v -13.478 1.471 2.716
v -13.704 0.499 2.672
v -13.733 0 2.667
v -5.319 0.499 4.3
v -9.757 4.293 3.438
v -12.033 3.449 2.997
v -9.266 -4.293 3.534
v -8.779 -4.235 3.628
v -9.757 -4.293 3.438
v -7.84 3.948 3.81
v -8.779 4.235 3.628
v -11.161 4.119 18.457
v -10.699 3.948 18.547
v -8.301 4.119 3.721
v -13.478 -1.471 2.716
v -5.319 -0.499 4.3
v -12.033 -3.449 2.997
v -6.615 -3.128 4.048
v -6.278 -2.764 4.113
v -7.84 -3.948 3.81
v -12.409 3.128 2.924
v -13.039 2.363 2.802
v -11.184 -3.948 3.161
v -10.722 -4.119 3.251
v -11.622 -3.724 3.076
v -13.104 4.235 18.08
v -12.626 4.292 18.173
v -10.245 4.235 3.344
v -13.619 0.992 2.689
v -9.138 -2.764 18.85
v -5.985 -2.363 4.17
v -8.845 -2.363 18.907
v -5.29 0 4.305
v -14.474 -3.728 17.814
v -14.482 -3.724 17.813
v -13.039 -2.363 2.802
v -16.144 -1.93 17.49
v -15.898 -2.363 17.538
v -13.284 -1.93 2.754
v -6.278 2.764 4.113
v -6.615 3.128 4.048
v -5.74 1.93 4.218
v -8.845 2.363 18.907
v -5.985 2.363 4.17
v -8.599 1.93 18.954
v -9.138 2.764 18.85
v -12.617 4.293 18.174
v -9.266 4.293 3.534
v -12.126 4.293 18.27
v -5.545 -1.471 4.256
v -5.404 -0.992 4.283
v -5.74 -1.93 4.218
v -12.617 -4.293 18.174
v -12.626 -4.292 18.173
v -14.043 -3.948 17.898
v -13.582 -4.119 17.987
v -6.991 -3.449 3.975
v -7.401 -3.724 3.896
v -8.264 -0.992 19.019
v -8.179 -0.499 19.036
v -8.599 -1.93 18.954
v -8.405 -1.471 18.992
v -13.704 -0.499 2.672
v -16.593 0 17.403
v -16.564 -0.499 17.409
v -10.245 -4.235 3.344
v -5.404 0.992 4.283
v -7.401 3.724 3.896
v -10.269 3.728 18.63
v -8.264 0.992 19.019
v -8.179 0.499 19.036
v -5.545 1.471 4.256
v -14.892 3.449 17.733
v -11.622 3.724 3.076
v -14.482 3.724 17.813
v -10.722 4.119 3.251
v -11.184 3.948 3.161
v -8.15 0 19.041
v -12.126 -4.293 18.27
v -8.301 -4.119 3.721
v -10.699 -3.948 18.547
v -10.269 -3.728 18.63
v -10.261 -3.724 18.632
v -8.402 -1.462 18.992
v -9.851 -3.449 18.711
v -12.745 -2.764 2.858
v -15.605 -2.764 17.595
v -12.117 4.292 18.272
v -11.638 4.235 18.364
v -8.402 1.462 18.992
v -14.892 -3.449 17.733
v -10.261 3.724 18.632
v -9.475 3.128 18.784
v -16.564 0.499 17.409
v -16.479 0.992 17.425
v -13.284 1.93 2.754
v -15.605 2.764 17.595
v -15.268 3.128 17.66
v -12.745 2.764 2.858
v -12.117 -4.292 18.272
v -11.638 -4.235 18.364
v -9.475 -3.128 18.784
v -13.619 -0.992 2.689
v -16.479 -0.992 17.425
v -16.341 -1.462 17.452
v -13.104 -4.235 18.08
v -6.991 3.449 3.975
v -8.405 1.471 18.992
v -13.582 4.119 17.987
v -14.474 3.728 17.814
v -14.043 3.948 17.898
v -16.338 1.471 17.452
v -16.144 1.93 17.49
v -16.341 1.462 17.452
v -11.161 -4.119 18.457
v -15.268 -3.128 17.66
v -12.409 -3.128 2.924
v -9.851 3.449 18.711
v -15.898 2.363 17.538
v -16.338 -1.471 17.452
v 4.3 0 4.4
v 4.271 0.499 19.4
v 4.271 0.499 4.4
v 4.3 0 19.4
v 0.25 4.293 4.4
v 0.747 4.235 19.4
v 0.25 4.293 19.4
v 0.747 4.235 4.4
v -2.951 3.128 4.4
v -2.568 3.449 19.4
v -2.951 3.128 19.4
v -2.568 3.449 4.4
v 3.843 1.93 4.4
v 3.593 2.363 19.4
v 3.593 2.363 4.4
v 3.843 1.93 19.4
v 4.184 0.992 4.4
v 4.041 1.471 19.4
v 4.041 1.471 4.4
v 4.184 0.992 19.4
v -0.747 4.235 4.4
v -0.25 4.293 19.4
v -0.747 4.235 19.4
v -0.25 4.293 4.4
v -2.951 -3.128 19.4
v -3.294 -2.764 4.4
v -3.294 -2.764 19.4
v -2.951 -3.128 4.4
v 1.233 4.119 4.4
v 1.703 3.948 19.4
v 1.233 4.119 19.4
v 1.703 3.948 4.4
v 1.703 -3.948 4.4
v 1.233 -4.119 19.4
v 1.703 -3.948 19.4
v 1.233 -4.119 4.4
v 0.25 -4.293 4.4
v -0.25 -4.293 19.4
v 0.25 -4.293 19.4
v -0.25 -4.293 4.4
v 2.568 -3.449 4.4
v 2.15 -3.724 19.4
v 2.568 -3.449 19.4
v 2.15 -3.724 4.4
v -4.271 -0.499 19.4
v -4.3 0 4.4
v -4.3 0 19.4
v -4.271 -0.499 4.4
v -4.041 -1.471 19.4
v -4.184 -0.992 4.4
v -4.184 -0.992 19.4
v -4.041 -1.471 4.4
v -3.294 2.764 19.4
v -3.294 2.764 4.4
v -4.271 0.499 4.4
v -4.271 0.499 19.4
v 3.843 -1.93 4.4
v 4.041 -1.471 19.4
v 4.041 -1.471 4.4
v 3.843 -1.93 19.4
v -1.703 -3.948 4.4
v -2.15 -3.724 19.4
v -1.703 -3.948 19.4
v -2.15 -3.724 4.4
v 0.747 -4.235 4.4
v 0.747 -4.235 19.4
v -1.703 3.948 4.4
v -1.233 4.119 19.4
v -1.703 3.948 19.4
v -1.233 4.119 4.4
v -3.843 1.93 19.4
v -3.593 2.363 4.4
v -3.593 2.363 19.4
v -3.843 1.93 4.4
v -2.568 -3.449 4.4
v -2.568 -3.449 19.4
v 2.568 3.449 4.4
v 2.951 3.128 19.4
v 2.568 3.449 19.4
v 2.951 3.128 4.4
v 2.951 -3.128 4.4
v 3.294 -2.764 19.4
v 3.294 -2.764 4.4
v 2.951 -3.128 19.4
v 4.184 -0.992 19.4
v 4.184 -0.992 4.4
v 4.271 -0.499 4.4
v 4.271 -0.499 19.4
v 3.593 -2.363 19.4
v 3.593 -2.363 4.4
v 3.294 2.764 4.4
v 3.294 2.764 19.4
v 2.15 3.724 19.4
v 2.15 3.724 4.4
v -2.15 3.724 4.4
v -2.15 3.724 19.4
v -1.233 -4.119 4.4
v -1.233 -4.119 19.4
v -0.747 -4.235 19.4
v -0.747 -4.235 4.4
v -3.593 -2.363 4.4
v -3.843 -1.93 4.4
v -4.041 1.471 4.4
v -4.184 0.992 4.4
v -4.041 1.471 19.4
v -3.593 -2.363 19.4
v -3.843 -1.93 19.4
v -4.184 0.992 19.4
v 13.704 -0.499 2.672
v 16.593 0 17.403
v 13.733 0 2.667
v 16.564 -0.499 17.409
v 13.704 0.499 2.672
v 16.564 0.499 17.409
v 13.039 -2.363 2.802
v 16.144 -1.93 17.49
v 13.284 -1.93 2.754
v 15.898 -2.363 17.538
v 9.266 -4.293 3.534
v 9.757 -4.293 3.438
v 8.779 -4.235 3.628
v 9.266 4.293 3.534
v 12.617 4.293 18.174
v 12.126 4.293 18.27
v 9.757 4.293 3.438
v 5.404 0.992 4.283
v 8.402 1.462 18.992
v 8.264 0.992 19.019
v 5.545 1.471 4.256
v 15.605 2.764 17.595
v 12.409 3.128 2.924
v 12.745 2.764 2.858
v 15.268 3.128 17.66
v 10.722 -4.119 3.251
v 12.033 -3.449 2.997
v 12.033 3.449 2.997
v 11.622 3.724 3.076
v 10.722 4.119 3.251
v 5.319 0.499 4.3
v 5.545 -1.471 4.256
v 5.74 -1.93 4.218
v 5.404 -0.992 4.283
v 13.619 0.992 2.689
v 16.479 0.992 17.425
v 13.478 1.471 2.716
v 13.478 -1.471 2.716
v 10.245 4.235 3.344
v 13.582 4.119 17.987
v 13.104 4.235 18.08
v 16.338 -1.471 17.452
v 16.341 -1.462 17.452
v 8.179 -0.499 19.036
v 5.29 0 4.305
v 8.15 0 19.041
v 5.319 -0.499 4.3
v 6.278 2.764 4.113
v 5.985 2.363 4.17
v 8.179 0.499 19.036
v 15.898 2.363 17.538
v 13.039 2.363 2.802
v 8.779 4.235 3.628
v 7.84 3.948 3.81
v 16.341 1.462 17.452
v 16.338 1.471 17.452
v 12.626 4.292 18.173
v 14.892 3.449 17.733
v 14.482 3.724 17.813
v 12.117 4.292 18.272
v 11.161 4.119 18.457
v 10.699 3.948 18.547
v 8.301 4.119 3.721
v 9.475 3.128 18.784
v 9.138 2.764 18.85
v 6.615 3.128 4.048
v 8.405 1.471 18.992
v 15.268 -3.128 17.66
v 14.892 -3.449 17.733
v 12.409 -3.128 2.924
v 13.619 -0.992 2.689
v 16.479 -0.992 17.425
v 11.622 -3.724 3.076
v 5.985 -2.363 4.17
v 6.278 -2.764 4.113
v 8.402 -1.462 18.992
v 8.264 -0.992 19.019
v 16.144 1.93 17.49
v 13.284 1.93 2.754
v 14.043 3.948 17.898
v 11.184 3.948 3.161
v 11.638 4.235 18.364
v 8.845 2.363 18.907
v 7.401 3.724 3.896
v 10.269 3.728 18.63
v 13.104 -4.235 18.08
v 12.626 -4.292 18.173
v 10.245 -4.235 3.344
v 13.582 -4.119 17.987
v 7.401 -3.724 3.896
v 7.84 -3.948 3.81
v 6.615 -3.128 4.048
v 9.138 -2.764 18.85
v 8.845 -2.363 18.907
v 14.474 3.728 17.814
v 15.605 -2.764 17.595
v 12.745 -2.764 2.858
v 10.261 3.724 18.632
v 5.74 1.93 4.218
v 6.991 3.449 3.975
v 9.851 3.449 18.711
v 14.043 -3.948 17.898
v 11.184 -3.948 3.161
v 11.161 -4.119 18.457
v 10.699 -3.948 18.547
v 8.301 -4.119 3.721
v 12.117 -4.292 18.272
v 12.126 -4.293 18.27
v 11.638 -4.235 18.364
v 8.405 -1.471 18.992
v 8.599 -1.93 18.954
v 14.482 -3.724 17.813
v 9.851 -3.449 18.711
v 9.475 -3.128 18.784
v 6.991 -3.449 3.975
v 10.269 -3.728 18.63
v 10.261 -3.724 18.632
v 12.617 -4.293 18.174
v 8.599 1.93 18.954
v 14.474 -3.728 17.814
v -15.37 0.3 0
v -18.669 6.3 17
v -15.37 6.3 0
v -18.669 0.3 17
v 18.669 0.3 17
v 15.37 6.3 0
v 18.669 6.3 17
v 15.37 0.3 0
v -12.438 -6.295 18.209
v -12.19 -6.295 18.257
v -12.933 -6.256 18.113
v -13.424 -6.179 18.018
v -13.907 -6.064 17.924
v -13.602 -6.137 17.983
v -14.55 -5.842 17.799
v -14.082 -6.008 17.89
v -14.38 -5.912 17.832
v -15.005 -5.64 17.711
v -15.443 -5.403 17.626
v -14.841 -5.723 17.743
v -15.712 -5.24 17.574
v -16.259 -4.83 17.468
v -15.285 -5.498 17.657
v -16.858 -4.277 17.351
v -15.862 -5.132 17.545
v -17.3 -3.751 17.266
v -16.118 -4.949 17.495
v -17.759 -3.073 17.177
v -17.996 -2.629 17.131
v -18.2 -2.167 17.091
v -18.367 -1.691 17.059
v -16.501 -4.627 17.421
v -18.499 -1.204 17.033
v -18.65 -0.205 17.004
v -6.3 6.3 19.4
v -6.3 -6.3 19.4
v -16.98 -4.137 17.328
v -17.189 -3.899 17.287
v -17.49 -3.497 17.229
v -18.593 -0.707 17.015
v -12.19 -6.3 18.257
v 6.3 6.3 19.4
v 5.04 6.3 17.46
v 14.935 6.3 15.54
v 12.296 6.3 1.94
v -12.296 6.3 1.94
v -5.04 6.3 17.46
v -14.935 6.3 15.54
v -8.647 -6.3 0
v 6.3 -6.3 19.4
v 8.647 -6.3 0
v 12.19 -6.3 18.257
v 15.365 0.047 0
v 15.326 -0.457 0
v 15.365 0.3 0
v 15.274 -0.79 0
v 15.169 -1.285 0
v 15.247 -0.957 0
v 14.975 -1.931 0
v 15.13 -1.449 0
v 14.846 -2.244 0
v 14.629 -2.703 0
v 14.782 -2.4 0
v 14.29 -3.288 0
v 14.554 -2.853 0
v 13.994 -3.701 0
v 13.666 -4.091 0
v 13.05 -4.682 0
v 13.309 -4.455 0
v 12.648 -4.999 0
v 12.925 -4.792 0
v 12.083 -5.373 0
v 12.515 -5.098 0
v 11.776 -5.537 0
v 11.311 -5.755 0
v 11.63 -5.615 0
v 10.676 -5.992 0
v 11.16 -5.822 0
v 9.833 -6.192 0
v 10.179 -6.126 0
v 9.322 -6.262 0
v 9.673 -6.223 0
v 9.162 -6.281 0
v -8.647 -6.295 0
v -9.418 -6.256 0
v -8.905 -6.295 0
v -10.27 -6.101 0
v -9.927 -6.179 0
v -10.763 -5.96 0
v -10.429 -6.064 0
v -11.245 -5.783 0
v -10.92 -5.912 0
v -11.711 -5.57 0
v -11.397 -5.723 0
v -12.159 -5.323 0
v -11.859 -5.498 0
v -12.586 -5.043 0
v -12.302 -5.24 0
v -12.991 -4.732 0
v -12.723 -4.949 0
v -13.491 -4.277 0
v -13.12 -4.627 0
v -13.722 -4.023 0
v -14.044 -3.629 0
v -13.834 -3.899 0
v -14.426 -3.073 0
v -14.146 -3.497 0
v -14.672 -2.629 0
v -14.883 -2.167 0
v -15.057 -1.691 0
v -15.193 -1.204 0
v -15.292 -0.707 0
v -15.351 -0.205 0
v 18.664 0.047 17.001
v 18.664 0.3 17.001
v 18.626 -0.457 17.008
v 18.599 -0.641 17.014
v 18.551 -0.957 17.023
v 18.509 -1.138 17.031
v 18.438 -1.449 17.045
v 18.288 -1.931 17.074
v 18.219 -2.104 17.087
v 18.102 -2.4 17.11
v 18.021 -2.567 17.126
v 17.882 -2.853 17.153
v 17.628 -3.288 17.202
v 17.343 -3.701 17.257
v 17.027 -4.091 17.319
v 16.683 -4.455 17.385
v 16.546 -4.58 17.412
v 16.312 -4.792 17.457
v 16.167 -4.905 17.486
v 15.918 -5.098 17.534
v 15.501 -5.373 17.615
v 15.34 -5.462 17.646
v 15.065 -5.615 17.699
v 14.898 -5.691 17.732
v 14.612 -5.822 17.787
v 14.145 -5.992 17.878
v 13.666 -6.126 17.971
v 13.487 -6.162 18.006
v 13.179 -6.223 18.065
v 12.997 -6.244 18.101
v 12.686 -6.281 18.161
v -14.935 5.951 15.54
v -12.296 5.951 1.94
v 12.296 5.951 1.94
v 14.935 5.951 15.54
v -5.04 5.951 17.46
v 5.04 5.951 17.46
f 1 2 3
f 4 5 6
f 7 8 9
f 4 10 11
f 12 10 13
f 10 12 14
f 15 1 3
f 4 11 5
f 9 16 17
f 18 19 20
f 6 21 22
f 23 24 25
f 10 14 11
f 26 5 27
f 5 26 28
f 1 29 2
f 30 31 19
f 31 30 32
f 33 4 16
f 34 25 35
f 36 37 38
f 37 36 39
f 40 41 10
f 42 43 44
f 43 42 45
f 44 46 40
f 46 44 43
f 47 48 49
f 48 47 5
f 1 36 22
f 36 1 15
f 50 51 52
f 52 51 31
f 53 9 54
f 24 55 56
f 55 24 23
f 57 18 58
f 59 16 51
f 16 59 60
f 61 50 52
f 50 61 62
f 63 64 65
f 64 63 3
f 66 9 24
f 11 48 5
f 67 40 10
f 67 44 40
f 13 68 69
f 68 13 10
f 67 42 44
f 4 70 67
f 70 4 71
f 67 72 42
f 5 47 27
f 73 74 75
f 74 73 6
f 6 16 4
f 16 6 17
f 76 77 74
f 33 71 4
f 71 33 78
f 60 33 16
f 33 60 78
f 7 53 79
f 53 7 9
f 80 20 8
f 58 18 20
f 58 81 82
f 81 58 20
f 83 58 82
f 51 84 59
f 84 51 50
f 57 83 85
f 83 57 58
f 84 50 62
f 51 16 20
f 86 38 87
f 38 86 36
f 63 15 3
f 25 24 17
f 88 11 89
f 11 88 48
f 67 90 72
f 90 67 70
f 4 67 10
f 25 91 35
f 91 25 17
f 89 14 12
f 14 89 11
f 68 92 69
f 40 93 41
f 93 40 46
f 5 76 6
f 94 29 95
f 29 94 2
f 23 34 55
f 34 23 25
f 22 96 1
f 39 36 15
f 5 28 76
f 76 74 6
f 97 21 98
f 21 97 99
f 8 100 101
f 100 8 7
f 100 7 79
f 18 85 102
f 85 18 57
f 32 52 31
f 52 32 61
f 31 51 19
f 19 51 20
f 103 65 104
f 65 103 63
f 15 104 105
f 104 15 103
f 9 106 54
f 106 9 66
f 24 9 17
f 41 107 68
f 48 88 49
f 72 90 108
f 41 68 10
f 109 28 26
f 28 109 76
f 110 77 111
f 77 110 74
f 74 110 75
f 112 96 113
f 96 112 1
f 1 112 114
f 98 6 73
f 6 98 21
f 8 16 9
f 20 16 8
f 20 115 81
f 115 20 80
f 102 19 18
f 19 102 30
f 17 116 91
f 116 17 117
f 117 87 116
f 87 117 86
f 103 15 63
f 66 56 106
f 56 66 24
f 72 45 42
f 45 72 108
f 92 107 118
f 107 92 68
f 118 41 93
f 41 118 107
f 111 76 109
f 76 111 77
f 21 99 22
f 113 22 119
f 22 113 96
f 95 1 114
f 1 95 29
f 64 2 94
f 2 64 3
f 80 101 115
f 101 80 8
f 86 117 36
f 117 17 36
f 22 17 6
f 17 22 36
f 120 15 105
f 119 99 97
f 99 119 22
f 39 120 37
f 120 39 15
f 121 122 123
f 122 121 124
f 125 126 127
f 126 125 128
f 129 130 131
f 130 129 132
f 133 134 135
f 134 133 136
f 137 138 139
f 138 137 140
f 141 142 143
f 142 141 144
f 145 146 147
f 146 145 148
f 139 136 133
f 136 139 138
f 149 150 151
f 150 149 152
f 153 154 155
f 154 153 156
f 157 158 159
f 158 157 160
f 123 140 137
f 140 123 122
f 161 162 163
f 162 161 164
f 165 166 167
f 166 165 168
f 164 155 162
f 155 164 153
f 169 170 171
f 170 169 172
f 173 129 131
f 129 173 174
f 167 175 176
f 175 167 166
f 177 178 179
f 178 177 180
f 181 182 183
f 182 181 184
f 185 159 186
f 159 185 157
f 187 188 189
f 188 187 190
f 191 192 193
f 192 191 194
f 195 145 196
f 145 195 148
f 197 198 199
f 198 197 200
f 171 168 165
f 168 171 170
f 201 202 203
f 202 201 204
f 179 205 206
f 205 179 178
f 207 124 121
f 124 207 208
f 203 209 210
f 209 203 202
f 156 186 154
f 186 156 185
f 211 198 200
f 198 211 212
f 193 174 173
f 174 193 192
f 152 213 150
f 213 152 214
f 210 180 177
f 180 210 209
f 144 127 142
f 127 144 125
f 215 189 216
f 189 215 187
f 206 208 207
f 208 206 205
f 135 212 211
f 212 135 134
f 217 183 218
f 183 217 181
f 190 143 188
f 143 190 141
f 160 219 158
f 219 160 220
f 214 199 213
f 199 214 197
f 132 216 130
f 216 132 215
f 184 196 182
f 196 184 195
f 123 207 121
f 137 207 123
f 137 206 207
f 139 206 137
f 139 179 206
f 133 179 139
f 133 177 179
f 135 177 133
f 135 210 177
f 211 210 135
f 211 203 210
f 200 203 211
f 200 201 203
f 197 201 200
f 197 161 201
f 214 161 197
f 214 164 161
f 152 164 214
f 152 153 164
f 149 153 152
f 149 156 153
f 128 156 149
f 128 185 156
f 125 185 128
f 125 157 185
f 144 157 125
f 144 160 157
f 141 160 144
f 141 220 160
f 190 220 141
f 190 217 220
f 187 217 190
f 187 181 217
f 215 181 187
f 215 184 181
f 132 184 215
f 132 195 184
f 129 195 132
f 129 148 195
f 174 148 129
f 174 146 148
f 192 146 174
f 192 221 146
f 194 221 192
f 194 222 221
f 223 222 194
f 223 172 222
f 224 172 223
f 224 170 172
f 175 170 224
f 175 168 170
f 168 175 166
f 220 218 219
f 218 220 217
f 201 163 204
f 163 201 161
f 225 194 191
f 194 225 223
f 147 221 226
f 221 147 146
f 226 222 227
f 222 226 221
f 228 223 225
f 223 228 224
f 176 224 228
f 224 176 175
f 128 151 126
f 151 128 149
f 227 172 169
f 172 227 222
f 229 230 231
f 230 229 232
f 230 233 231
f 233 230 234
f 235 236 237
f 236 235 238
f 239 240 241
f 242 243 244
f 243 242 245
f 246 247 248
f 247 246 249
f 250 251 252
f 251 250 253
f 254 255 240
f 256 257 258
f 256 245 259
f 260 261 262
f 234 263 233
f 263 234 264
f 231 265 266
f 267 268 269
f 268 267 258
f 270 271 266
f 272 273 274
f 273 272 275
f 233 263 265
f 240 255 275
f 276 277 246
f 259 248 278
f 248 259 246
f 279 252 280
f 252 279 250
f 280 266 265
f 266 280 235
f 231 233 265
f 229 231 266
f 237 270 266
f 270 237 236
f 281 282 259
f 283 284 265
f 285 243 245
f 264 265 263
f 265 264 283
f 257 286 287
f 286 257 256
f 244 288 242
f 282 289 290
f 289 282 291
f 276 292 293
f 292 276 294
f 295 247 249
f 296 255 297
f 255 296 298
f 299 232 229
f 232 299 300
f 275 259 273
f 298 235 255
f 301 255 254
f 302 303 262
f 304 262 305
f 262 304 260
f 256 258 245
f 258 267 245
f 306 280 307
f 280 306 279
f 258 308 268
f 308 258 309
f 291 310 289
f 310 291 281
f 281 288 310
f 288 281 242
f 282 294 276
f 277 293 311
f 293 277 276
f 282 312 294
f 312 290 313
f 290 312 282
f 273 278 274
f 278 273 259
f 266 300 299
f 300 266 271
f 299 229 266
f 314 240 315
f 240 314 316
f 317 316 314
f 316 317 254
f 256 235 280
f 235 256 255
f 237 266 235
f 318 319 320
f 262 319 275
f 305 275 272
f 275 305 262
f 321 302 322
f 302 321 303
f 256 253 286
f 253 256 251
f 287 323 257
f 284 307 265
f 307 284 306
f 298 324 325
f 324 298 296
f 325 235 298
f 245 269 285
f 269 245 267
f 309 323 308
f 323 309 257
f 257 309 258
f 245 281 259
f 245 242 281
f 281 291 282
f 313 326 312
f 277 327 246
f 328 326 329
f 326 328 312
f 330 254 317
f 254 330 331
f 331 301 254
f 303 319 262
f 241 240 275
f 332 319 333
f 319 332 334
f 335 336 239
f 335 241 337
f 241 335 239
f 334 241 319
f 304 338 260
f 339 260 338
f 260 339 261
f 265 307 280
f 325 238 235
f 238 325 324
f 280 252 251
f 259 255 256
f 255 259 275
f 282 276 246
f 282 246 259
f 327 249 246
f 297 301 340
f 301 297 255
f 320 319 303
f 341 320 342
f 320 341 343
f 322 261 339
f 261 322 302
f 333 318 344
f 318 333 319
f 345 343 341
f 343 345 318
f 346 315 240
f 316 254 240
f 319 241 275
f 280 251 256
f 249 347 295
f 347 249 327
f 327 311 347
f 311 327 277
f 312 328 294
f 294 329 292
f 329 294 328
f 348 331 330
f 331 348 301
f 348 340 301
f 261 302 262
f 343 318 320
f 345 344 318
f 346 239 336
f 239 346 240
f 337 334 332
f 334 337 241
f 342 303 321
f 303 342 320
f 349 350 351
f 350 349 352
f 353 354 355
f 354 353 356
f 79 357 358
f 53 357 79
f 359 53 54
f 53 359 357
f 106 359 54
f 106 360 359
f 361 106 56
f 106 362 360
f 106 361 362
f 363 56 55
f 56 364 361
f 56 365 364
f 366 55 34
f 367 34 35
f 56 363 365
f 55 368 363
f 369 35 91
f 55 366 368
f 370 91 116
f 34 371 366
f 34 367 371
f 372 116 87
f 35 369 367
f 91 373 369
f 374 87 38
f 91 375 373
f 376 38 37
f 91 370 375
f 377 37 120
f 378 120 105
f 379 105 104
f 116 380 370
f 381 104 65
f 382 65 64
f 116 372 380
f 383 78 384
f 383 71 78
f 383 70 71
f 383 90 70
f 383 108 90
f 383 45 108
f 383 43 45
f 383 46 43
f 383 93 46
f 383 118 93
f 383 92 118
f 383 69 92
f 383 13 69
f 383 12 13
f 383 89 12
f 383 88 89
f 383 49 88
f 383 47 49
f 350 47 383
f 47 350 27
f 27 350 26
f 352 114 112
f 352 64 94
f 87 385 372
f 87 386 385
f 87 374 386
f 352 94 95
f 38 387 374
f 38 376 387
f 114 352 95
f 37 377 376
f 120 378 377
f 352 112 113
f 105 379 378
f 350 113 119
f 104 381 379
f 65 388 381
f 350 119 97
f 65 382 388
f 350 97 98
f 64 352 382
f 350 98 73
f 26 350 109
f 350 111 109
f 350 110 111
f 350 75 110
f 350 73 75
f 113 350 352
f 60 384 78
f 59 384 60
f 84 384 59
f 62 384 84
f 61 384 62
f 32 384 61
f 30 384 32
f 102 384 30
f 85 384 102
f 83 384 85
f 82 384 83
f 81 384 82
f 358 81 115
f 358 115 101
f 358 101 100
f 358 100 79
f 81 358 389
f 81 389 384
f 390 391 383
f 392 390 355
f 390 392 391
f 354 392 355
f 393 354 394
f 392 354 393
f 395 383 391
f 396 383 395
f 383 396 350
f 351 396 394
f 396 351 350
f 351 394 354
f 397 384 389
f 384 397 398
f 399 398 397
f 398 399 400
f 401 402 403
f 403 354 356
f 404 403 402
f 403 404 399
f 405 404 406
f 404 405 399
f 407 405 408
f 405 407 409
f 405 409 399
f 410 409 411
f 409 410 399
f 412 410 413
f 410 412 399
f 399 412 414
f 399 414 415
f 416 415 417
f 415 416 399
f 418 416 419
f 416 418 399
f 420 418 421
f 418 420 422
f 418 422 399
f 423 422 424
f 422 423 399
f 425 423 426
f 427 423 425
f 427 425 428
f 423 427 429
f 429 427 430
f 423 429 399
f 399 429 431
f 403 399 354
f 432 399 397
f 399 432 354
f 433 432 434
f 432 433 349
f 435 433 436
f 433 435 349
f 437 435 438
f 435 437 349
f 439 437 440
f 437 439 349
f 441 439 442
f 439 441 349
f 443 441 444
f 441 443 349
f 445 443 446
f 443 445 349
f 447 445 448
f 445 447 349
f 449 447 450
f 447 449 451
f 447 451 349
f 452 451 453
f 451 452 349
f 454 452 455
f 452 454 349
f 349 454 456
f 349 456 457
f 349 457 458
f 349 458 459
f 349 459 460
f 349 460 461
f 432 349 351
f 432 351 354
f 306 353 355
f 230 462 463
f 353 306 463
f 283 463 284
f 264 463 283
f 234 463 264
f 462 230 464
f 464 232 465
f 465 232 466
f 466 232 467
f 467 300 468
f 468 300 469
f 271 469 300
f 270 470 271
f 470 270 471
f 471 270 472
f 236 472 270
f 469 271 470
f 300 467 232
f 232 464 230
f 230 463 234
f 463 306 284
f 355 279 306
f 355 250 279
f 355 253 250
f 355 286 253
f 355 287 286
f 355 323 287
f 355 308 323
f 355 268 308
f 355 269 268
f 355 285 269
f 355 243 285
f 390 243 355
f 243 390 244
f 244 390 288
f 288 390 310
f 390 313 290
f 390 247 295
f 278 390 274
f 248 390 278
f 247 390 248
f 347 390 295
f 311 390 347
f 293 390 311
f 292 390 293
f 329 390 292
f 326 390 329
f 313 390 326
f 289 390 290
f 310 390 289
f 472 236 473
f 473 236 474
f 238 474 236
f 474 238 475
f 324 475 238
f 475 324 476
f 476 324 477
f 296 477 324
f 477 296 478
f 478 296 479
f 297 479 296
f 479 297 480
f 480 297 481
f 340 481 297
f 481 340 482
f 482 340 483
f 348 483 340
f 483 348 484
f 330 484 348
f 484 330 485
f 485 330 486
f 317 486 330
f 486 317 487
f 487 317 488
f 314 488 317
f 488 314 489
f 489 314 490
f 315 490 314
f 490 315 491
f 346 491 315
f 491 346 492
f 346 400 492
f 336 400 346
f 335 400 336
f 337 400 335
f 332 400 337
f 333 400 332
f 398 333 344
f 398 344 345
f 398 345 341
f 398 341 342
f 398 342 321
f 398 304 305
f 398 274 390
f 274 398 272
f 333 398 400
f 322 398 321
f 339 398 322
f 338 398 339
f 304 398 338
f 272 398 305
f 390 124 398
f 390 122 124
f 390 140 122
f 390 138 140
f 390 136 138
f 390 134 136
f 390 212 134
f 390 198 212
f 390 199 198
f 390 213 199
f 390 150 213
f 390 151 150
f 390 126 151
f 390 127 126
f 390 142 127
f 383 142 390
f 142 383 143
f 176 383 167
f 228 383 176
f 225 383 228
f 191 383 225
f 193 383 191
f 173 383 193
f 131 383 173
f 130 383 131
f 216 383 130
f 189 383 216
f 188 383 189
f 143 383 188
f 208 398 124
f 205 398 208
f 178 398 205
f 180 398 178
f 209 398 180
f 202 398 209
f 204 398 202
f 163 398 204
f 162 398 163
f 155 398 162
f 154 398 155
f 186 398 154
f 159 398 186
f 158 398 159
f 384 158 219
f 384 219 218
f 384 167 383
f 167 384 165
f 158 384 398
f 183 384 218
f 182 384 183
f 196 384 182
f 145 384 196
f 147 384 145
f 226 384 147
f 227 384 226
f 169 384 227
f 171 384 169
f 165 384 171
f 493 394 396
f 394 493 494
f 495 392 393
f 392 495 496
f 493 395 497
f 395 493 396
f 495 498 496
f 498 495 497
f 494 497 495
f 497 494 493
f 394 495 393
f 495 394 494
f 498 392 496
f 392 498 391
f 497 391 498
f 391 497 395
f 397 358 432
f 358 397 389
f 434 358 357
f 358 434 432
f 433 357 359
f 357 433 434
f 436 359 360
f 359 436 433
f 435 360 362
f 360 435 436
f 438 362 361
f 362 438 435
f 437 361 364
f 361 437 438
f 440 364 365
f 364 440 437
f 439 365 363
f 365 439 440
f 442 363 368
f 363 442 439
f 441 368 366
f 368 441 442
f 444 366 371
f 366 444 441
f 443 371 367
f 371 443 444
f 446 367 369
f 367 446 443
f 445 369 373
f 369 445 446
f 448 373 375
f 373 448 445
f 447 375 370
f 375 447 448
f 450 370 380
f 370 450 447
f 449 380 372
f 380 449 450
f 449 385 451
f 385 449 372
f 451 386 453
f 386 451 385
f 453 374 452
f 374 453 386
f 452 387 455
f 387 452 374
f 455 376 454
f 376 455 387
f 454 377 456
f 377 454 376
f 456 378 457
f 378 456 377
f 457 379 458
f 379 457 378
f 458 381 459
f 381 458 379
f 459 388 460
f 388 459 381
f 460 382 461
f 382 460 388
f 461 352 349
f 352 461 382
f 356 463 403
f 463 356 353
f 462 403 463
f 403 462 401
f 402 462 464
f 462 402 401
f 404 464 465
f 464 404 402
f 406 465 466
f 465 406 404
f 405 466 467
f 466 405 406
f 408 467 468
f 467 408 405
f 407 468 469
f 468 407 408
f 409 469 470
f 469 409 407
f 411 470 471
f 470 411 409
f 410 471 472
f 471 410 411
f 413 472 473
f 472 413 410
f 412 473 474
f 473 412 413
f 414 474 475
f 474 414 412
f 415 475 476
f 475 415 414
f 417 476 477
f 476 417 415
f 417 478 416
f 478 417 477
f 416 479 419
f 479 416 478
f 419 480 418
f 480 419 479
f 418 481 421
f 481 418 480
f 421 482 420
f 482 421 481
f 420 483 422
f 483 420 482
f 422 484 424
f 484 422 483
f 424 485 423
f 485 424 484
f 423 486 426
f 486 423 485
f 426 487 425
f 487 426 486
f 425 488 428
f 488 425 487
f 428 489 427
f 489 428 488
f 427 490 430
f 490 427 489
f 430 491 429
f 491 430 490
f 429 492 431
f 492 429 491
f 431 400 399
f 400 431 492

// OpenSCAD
arrowSpread = 300;
arrowLength = 787.4;
arrowDiameter = 8.6;
holeDepth = 15;
minThickness = 2;
backInset = 0.35;
backInsetScale = 0.8;

fudge = 0.001;
fw = 0.5;

function afn(r) = 180 / asin(fw / (2 * r));

module drawCorner(r, height) {
  translate([r, r]) rotate([0, 0, 180]) linear_extrude(height) difference() {
    square([r + fudge, r + fudge]);
    circle(r=r, $fn=afn(r));
  }
}

module drawBlockPolyhedron(faceSize, h, angle) {
  translate([0, faceSize, 0]) rotate([90, 0, 0]) linear_extrude(faceSize)
    drawBlockPolygon(faceSize, h, angle);
}

module drawBlockPolygon(faceSize, h, angle) {
  x = faceSize;
  z = sin(90 - angle) * faceSize;
  n = cos(90 - angle) * faceSize;
  j = tan(angle) * (h - n);
  
  polygon([
    [j, 0],
    [2 * z + faceSize - j, 0],
    [2 * z + faceSize, h - n],
    [z + faceSize, h],
    [z, h],
    [0, h - n]
  ]);
}

module arrowShafts(spread, length, d, lift, inset, faceSize) {
  angle = asin(spread / (2 * length));
  o = faceSize * sin(angle);
  
  translate([0, 0, o - lift])
    for (a = [-angle, 0, angle])
      rotate([0, a, 0]) translate([0, 0, lift - inset])
        cylinder(h = length, r = d / 2, $fn=afn(d / 2));
}

module drawBlock() {
  faceSize = arrowDiameter + minThickness * 2;
  arrowAngle = asin(arrowSpread / (2 * arrowLength));
  arrowLift = faceSize / tan(arrowAngle);
  blockWidth = 2 * sin(90 - arrowAngle) * faceSize + faceSize;
  n = cos(90 - arrowAngle) * faceSize;
  blockHeight = holeDepth + n + minThickness;
  j = tan(arrowAngle) * (blockHeight - n);
  blockRadius = arrowDiameter - minThickness;

  echo("faceSize", faceSize);
  echo("arrowAngle", arrowAngle);
  echo("arrowLift", arrowLift);
  echo("blockWidth", blockWidth);
  echo("blockHeight", blockHeight);
  echo("blockRadius", blockRadius);

  difference() {
    translate([-blockWidth / 2, -faceSize / 2, 0])
      drawBlockPolyhedron(faceSize, blockHeight, arrowAngle);
    
    translate([
      blockWidth * backInsetScale / -2,
      -faceSize / 2 + faceSize + fudge,
      (blockHeight - blockHeight * backInsetScale) / 2
    ])
      rotate([90, 0, 0]) linear_extrude(backInset) scale(backInsetScale)
        drawBlockPolygon(faceSize, blockHeight, arrowAngle);
    
    translate([0, 0, blockHeight - faceSize * sin(arrowAngle)])
      arrowShafts(arrowSpread, arrowLength, arrowDiameter, arrowLift, holeDepth, faceSize);
    
    translate([blockWidth / -2 + j, faceSize / -2, 0]) rotate([0, -arrowAngle, 0])
      translate([0, 0, -blockHeight])
        drawCorner(blockRadius, blockHeight * 3);
    
    translate([blockWidth / 2 - j, faceSize / -2, 0]) rotate([0, arrowAngle, 0])
      rotate([0, 0, 90]) translate([0, 0, -blockHeight])
        drawCorner(blockRadius, blockHeight * 3);
  }
}

drawBlock();
